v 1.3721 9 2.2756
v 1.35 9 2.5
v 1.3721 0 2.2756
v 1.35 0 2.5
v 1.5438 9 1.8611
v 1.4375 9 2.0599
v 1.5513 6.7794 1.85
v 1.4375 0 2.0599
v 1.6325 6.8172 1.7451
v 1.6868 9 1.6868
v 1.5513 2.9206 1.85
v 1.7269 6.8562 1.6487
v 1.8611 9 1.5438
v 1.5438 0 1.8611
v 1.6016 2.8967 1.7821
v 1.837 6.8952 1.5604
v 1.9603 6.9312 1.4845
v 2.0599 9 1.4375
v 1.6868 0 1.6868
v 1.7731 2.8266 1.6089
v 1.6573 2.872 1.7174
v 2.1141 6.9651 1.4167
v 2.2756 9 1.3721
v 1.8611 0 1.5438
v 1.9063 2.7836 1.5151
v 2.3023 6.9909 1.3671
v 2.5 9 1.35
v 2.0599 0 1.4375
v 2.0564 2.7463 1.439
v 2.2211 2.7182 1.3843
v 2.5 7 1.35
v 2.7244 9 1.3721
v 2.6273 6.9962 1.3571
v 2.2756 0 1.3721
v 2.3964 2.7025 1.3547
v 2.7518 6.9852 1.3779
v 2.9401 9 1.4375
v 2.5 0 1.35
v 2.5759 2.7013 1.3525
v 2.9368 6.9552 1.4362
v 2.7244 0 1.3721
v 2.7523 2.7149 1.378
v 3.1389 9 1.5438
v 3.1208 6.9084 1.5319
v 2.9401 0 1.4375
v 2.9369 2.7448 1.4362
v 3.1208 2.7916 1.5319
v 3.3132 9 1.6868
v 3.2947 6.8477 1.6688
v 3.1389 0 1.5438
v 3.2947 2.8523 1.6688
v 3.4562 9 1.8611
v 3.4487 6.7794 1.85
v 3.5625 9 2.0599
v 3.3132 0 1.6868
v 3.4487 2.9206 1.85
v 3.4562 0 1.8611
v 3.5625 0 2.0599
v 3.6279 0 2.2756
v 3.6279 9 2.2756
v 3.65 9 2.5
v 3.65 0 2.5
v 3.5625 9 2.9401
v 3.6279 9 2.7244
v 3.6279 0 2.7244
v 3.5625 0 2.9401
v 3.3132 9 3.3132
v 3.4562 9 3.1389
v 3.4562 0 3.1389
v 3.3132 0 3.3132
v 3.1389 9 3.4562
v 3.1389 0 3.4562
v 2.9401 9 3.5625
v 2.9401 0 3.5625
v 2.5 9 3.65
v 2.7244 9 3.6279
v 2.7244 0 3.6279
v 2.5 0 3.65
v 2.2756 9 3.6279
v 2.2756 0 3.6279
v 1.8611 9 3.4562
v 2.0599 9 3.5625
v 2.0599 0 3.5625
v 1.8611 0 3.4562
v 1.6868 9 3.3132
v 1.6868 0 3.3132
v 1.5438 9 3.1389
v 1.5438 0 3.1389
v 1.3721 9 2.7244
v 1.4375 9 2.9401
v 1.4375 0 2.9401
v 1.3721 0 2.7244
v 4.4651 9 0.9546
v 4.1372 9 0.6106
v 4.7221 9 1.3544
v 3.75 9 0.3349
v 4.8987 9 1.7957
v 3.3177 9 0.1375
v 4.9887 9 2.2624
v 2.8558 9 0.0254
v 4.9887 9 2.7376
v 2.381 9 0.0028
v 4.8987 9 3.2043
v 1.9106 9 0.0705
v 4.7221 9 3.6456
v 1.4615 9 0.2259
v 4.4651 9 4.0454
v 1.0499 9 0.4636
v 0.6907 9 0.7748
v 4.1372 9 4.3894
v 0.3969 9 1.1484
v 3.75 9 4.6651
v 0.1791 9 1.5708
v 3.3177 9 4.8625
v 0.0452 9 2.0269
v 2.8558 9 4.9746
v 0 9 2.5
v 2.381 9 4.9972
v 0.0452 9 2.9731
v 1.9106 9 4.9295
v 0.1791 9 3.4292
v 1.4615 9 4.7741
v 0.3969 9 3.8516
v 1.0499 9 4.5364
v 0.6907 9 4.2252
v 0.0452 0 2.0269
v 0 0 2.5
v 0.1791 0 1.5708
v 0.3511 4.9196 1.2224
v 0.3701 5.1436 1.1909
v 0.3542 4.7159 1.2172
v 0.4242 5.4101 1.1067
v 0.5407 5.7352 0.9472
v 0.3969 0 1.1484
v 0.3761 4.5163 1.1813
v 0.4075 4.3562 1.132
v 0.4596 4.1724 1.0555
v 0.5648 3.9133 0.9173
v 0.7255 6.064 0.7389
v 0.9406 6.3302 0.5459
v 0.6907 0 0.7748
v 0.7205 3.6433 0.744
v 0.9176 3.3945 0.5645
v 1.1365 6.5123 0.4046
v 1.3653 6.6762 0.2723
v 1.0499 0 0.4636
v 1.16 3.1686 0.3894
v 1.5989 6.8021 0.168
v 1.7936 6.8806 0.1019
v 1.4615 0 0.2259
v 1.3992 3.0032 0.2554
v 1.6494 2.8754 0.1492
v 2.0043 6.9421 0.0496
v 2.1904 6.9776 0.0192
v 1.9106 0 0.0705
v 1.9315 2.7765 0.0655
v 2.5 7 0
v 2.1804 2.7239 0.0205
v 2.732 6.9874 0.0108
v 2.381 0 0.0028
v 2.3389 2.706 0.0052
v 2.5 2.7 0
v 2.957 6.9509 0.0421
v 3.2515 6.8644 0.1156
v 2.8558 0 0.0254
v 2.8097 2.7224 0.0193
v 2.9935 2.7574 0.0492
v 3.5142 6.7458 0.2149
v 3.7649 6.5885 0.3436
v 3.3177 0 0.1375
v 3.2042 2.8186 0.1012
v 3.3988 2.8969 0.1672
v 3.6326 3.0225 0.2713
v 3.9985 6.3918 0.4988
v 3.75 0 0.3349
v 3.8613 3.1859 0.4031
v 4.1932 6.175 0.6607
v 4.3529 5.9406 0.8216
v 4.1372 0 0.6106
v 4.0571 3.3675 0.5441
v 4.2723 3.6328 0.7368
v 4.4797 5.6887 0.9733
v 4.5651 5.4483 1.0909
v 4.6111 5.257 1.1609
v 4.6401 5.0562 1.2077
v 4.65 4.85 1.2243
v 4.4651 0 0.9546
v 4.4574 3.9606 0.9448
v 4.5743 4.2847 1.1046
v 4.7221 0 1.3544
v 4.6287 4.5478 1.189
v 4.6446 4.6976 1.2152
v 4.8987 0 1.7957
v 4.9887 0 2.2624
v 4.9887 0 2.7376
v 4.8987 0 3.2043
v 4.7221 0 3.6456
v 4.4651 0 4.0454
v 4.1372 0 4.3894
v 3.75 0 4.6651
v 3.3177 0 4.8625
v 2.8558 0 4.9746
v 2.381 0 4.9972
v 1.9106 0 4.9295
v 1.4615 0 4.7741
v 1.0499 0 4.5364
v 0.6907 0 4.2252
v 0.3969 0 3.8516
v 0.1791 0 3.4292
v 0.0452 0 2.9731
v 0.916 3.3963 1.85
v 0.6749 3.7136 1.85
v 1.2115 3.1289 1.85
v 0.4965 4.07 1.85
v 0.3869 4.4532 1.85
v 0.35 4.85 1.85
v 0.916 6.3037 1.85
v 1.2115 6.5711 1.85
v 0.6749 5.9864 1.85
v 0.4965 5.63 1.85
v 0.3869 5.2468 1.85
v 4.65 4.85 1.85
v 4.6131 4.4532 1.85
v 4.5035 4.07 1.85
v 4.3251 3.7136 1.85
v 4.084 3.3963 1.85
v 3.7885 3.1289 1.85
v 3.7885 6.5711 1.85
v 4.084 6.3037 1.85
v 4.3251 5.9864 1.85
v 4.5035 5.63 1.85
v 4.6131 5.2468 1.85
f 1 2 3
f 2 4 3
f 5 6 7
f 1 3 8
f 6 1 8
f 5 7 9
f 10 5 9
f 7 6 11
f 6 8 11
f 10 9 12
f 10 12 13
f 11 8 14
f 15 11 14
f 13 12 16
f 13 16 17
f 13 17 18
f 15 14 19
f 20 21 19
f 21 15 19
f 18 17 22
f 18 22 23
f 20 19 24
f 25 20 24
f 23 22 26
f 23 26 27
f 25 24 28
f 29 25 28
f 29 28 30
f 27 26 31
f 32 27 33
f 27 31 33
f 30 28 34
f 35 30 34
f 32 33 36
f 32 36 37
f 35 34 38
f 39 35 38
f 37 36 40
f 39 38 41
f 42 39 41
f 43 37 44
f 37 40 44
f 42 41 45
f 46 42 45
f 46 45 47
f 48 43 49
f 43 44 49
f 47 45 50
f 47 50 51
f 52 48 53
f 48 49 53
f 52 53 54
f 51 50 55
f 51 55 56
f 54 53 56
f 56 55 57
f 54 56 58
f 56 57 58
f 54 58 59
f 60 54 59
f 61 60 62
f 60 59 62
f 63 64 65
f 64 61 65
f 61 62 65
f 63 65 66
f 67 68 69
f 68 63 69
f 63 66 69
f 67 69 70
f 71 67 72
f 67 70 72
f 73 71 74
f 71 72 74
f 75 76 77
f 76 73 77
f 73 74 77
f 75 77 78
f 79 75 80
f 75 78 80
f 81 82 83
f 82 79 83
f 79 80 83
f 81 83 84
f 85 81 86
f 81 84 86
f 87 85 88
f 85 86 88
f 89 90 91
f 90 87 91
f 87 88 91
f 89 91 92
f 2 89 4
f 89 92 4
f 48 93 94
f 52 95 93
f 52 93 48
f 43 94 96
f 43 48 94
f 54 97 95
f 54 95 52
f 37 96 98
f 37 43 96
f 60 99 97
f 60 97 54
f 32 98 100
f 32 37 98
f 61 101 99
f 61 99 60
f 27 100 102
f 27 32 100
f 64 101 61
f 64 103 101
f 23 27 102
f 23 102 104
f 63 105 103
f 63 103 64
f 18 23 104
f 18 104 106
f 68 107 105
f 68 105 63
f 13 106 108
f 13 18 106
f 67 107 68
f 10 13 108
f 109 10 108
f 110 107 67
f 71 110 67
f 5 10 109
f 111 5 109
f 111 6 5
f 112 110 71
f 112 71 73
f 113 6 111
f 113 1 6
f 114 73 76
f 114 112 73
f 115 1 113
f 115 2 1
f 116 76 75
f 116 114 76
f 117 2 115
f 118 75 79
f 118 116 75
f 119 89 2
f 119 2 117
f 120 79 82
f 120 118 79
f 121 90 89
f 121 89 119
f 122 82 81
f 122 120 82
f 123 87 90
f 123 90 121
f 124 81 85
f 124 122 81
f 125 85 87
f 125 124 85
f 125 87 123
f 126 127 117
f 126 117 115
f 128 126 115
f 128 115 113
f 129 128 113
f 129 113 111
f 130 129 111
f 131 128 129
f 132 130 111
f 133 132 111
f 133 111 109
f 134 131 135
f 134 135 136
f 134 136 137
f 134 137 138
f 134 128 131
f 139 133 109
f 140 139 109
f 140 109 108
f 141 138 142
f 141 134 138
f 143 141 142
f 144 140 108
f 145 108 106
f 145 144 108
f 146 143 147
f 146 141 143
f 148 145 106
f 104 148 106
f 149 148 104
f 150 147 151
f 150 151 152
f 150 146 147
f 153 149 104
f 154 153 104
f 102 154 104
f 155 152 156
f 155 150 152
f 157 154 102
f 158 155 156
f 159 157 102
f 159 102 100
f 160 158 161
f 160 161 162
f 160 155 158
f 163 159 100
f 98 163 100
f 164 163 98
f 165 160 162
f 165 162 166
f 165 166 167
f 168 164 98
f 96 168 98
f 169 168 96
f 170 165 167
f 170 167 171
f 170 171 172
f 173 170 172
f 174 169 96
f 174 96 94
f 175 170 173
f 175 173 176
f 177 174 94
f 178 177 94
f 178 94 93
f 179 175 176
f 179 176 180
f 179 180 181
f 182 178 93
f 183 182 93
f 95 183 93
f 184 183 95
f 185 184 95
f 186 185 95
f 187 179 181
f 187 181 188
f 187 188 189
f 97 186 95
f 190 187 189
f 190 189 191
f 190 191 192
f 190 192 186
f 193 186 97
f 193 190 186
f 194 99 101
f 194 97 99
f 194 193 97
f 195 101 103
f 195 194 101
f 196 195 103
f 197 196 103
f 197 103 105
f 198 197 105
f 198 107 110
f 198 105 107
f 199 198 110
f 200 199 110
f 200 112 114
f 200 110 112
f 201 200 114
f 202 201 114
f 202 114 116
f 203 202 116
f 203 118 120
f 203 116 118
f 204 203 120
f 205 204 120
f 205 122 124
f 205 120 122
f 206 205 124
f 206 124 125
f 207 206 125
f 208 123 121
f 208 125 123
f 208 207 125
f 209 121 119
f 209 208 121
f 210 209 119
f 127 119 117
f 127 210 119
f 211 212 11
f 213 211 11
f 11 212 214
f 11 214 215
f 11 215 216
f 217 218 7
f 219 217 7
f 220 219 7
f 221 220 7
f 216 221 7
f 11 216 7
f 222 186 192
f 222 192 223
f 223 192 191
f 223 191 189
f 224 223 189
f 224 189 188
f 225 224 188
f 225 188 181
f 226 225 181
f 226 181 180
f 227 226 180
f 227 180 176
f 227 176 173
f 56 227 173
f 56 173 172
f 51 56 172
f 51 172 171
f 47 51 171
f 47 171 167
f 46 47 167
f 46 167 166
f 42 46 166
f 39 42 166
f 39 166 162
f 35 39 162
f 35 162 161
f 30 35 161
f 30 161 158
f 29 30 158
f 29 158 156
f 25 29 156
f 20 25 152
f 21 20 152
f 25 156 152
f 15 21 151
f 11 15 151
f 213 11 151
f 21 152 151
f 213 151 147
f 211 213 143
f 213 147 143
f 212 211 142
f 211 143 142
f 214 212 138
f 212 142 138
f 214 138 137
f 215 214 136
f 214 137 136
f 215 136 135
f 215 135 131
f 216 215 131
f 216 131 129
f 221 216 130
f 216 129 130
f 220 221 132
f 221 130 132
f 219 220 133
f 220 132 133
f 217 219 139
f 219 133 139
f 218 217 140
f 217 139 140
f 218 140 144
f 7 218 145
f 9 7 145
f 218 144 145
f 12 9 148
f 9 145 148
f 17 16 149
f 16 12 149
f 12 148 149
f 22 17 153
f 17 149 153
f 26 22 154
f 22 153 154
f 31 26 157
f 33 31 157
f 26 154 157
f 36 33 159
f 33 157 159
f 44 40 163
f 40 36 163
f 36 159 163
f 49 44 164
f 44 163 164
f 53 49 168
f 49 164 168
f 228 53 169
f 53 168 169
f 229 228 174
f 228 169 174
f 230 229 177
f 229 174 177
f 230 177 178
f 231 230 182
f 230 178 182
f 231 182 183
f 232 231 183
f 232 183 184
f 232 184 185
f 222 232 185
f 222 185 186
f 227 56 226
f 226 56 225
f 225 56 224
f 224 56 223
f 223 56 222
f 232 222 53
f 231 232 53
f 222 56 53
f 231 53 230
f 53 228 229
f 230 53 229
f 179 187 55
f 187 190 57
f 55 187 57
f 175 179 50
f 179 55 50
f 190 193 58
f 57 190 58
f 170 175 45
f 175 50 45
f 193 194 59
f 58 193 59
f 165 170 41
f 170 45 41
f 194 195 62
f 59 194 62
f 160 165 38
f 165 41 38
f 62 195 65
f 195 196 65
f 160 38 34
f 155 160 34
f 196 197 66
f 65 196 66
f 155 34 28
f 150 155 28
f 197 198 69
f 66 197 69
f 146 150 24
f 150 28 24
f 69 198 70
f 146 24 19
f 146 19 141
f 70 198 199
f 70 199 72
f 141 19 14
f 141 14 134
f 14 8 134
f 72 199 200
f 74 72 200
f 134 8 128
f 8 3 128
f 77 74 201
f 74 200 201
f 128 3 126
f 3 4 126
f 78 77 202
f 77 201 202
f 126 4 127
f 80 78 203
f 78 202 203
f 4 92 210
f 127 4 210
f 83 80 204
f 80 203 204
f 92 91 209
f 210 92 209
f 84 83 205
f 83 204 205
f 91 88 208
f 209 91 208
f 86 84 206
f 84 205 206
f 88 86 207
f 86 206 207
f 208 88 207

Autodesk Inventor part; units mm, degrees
ref_plane "YZ Plane" through (0, 0, 0) normal (1, 0, 0) x (0, 1, 0)
ref_plane "XZ Plane" through (0, 0, 0) normal (0, 1, 0) x (-1, 0, 0)
sketch "Sketch1" plane through (0, 0, 0) normal (0, 1, 0) x (-1, 0, 0)
  circle A0 centre (-2.5, 2.5) radius 1.15
  circle A1 centre (-2.5, 2.5) radius 2.5
  line L0 (0, 0) -> (-7.3028, 0) construction
  line L1 (0, 0) -> (0, 4.3038) construction
  dimension "d0" = 2.3
  dimension "d1" = 5
extrude "Extrusion1" add sketch "Sketch1" along normal blind 9
ref_plane "Work Plane1" through (2.5, 0, 1.35) normal (0, 0, 1) x (1, 0, 0)
ref_plane "screwMaxDist" through (2.5, 0, 1.85) normal (0, 0, 1) x (1, 0, 0)
sketch "Sketch2" plane through (0, 0, 0) normal (0, 0, 1) x (1, 0, 0)
  line L0 (5, 9) -> (0, 9) projected
  circle A0 centre (2.5, 4.85) radius 2.15
  line L1 (5, 9) -> (0, 9) projected
  line L2 (5, 0) -> (0, 0) projected
  line L3 (0, 0) -> (0, 9) projected
  line L4 (0, 7) -> (5, 7)
  line L5 (5, 0) -> (5, 9) projected
  dimension "d5" = 4.3
  dimension "d15" = 2
  dimension "d16" = 2.5
  dimension "d17" = 2.5
extrude "Extrusion2" cut sketch "Sketch2" along normal up to surface (1.85 mm away) contours A0
equation "\"d16\" = d17"
properties part number "motor_shaft_adapter" material "ABS Plastic"
